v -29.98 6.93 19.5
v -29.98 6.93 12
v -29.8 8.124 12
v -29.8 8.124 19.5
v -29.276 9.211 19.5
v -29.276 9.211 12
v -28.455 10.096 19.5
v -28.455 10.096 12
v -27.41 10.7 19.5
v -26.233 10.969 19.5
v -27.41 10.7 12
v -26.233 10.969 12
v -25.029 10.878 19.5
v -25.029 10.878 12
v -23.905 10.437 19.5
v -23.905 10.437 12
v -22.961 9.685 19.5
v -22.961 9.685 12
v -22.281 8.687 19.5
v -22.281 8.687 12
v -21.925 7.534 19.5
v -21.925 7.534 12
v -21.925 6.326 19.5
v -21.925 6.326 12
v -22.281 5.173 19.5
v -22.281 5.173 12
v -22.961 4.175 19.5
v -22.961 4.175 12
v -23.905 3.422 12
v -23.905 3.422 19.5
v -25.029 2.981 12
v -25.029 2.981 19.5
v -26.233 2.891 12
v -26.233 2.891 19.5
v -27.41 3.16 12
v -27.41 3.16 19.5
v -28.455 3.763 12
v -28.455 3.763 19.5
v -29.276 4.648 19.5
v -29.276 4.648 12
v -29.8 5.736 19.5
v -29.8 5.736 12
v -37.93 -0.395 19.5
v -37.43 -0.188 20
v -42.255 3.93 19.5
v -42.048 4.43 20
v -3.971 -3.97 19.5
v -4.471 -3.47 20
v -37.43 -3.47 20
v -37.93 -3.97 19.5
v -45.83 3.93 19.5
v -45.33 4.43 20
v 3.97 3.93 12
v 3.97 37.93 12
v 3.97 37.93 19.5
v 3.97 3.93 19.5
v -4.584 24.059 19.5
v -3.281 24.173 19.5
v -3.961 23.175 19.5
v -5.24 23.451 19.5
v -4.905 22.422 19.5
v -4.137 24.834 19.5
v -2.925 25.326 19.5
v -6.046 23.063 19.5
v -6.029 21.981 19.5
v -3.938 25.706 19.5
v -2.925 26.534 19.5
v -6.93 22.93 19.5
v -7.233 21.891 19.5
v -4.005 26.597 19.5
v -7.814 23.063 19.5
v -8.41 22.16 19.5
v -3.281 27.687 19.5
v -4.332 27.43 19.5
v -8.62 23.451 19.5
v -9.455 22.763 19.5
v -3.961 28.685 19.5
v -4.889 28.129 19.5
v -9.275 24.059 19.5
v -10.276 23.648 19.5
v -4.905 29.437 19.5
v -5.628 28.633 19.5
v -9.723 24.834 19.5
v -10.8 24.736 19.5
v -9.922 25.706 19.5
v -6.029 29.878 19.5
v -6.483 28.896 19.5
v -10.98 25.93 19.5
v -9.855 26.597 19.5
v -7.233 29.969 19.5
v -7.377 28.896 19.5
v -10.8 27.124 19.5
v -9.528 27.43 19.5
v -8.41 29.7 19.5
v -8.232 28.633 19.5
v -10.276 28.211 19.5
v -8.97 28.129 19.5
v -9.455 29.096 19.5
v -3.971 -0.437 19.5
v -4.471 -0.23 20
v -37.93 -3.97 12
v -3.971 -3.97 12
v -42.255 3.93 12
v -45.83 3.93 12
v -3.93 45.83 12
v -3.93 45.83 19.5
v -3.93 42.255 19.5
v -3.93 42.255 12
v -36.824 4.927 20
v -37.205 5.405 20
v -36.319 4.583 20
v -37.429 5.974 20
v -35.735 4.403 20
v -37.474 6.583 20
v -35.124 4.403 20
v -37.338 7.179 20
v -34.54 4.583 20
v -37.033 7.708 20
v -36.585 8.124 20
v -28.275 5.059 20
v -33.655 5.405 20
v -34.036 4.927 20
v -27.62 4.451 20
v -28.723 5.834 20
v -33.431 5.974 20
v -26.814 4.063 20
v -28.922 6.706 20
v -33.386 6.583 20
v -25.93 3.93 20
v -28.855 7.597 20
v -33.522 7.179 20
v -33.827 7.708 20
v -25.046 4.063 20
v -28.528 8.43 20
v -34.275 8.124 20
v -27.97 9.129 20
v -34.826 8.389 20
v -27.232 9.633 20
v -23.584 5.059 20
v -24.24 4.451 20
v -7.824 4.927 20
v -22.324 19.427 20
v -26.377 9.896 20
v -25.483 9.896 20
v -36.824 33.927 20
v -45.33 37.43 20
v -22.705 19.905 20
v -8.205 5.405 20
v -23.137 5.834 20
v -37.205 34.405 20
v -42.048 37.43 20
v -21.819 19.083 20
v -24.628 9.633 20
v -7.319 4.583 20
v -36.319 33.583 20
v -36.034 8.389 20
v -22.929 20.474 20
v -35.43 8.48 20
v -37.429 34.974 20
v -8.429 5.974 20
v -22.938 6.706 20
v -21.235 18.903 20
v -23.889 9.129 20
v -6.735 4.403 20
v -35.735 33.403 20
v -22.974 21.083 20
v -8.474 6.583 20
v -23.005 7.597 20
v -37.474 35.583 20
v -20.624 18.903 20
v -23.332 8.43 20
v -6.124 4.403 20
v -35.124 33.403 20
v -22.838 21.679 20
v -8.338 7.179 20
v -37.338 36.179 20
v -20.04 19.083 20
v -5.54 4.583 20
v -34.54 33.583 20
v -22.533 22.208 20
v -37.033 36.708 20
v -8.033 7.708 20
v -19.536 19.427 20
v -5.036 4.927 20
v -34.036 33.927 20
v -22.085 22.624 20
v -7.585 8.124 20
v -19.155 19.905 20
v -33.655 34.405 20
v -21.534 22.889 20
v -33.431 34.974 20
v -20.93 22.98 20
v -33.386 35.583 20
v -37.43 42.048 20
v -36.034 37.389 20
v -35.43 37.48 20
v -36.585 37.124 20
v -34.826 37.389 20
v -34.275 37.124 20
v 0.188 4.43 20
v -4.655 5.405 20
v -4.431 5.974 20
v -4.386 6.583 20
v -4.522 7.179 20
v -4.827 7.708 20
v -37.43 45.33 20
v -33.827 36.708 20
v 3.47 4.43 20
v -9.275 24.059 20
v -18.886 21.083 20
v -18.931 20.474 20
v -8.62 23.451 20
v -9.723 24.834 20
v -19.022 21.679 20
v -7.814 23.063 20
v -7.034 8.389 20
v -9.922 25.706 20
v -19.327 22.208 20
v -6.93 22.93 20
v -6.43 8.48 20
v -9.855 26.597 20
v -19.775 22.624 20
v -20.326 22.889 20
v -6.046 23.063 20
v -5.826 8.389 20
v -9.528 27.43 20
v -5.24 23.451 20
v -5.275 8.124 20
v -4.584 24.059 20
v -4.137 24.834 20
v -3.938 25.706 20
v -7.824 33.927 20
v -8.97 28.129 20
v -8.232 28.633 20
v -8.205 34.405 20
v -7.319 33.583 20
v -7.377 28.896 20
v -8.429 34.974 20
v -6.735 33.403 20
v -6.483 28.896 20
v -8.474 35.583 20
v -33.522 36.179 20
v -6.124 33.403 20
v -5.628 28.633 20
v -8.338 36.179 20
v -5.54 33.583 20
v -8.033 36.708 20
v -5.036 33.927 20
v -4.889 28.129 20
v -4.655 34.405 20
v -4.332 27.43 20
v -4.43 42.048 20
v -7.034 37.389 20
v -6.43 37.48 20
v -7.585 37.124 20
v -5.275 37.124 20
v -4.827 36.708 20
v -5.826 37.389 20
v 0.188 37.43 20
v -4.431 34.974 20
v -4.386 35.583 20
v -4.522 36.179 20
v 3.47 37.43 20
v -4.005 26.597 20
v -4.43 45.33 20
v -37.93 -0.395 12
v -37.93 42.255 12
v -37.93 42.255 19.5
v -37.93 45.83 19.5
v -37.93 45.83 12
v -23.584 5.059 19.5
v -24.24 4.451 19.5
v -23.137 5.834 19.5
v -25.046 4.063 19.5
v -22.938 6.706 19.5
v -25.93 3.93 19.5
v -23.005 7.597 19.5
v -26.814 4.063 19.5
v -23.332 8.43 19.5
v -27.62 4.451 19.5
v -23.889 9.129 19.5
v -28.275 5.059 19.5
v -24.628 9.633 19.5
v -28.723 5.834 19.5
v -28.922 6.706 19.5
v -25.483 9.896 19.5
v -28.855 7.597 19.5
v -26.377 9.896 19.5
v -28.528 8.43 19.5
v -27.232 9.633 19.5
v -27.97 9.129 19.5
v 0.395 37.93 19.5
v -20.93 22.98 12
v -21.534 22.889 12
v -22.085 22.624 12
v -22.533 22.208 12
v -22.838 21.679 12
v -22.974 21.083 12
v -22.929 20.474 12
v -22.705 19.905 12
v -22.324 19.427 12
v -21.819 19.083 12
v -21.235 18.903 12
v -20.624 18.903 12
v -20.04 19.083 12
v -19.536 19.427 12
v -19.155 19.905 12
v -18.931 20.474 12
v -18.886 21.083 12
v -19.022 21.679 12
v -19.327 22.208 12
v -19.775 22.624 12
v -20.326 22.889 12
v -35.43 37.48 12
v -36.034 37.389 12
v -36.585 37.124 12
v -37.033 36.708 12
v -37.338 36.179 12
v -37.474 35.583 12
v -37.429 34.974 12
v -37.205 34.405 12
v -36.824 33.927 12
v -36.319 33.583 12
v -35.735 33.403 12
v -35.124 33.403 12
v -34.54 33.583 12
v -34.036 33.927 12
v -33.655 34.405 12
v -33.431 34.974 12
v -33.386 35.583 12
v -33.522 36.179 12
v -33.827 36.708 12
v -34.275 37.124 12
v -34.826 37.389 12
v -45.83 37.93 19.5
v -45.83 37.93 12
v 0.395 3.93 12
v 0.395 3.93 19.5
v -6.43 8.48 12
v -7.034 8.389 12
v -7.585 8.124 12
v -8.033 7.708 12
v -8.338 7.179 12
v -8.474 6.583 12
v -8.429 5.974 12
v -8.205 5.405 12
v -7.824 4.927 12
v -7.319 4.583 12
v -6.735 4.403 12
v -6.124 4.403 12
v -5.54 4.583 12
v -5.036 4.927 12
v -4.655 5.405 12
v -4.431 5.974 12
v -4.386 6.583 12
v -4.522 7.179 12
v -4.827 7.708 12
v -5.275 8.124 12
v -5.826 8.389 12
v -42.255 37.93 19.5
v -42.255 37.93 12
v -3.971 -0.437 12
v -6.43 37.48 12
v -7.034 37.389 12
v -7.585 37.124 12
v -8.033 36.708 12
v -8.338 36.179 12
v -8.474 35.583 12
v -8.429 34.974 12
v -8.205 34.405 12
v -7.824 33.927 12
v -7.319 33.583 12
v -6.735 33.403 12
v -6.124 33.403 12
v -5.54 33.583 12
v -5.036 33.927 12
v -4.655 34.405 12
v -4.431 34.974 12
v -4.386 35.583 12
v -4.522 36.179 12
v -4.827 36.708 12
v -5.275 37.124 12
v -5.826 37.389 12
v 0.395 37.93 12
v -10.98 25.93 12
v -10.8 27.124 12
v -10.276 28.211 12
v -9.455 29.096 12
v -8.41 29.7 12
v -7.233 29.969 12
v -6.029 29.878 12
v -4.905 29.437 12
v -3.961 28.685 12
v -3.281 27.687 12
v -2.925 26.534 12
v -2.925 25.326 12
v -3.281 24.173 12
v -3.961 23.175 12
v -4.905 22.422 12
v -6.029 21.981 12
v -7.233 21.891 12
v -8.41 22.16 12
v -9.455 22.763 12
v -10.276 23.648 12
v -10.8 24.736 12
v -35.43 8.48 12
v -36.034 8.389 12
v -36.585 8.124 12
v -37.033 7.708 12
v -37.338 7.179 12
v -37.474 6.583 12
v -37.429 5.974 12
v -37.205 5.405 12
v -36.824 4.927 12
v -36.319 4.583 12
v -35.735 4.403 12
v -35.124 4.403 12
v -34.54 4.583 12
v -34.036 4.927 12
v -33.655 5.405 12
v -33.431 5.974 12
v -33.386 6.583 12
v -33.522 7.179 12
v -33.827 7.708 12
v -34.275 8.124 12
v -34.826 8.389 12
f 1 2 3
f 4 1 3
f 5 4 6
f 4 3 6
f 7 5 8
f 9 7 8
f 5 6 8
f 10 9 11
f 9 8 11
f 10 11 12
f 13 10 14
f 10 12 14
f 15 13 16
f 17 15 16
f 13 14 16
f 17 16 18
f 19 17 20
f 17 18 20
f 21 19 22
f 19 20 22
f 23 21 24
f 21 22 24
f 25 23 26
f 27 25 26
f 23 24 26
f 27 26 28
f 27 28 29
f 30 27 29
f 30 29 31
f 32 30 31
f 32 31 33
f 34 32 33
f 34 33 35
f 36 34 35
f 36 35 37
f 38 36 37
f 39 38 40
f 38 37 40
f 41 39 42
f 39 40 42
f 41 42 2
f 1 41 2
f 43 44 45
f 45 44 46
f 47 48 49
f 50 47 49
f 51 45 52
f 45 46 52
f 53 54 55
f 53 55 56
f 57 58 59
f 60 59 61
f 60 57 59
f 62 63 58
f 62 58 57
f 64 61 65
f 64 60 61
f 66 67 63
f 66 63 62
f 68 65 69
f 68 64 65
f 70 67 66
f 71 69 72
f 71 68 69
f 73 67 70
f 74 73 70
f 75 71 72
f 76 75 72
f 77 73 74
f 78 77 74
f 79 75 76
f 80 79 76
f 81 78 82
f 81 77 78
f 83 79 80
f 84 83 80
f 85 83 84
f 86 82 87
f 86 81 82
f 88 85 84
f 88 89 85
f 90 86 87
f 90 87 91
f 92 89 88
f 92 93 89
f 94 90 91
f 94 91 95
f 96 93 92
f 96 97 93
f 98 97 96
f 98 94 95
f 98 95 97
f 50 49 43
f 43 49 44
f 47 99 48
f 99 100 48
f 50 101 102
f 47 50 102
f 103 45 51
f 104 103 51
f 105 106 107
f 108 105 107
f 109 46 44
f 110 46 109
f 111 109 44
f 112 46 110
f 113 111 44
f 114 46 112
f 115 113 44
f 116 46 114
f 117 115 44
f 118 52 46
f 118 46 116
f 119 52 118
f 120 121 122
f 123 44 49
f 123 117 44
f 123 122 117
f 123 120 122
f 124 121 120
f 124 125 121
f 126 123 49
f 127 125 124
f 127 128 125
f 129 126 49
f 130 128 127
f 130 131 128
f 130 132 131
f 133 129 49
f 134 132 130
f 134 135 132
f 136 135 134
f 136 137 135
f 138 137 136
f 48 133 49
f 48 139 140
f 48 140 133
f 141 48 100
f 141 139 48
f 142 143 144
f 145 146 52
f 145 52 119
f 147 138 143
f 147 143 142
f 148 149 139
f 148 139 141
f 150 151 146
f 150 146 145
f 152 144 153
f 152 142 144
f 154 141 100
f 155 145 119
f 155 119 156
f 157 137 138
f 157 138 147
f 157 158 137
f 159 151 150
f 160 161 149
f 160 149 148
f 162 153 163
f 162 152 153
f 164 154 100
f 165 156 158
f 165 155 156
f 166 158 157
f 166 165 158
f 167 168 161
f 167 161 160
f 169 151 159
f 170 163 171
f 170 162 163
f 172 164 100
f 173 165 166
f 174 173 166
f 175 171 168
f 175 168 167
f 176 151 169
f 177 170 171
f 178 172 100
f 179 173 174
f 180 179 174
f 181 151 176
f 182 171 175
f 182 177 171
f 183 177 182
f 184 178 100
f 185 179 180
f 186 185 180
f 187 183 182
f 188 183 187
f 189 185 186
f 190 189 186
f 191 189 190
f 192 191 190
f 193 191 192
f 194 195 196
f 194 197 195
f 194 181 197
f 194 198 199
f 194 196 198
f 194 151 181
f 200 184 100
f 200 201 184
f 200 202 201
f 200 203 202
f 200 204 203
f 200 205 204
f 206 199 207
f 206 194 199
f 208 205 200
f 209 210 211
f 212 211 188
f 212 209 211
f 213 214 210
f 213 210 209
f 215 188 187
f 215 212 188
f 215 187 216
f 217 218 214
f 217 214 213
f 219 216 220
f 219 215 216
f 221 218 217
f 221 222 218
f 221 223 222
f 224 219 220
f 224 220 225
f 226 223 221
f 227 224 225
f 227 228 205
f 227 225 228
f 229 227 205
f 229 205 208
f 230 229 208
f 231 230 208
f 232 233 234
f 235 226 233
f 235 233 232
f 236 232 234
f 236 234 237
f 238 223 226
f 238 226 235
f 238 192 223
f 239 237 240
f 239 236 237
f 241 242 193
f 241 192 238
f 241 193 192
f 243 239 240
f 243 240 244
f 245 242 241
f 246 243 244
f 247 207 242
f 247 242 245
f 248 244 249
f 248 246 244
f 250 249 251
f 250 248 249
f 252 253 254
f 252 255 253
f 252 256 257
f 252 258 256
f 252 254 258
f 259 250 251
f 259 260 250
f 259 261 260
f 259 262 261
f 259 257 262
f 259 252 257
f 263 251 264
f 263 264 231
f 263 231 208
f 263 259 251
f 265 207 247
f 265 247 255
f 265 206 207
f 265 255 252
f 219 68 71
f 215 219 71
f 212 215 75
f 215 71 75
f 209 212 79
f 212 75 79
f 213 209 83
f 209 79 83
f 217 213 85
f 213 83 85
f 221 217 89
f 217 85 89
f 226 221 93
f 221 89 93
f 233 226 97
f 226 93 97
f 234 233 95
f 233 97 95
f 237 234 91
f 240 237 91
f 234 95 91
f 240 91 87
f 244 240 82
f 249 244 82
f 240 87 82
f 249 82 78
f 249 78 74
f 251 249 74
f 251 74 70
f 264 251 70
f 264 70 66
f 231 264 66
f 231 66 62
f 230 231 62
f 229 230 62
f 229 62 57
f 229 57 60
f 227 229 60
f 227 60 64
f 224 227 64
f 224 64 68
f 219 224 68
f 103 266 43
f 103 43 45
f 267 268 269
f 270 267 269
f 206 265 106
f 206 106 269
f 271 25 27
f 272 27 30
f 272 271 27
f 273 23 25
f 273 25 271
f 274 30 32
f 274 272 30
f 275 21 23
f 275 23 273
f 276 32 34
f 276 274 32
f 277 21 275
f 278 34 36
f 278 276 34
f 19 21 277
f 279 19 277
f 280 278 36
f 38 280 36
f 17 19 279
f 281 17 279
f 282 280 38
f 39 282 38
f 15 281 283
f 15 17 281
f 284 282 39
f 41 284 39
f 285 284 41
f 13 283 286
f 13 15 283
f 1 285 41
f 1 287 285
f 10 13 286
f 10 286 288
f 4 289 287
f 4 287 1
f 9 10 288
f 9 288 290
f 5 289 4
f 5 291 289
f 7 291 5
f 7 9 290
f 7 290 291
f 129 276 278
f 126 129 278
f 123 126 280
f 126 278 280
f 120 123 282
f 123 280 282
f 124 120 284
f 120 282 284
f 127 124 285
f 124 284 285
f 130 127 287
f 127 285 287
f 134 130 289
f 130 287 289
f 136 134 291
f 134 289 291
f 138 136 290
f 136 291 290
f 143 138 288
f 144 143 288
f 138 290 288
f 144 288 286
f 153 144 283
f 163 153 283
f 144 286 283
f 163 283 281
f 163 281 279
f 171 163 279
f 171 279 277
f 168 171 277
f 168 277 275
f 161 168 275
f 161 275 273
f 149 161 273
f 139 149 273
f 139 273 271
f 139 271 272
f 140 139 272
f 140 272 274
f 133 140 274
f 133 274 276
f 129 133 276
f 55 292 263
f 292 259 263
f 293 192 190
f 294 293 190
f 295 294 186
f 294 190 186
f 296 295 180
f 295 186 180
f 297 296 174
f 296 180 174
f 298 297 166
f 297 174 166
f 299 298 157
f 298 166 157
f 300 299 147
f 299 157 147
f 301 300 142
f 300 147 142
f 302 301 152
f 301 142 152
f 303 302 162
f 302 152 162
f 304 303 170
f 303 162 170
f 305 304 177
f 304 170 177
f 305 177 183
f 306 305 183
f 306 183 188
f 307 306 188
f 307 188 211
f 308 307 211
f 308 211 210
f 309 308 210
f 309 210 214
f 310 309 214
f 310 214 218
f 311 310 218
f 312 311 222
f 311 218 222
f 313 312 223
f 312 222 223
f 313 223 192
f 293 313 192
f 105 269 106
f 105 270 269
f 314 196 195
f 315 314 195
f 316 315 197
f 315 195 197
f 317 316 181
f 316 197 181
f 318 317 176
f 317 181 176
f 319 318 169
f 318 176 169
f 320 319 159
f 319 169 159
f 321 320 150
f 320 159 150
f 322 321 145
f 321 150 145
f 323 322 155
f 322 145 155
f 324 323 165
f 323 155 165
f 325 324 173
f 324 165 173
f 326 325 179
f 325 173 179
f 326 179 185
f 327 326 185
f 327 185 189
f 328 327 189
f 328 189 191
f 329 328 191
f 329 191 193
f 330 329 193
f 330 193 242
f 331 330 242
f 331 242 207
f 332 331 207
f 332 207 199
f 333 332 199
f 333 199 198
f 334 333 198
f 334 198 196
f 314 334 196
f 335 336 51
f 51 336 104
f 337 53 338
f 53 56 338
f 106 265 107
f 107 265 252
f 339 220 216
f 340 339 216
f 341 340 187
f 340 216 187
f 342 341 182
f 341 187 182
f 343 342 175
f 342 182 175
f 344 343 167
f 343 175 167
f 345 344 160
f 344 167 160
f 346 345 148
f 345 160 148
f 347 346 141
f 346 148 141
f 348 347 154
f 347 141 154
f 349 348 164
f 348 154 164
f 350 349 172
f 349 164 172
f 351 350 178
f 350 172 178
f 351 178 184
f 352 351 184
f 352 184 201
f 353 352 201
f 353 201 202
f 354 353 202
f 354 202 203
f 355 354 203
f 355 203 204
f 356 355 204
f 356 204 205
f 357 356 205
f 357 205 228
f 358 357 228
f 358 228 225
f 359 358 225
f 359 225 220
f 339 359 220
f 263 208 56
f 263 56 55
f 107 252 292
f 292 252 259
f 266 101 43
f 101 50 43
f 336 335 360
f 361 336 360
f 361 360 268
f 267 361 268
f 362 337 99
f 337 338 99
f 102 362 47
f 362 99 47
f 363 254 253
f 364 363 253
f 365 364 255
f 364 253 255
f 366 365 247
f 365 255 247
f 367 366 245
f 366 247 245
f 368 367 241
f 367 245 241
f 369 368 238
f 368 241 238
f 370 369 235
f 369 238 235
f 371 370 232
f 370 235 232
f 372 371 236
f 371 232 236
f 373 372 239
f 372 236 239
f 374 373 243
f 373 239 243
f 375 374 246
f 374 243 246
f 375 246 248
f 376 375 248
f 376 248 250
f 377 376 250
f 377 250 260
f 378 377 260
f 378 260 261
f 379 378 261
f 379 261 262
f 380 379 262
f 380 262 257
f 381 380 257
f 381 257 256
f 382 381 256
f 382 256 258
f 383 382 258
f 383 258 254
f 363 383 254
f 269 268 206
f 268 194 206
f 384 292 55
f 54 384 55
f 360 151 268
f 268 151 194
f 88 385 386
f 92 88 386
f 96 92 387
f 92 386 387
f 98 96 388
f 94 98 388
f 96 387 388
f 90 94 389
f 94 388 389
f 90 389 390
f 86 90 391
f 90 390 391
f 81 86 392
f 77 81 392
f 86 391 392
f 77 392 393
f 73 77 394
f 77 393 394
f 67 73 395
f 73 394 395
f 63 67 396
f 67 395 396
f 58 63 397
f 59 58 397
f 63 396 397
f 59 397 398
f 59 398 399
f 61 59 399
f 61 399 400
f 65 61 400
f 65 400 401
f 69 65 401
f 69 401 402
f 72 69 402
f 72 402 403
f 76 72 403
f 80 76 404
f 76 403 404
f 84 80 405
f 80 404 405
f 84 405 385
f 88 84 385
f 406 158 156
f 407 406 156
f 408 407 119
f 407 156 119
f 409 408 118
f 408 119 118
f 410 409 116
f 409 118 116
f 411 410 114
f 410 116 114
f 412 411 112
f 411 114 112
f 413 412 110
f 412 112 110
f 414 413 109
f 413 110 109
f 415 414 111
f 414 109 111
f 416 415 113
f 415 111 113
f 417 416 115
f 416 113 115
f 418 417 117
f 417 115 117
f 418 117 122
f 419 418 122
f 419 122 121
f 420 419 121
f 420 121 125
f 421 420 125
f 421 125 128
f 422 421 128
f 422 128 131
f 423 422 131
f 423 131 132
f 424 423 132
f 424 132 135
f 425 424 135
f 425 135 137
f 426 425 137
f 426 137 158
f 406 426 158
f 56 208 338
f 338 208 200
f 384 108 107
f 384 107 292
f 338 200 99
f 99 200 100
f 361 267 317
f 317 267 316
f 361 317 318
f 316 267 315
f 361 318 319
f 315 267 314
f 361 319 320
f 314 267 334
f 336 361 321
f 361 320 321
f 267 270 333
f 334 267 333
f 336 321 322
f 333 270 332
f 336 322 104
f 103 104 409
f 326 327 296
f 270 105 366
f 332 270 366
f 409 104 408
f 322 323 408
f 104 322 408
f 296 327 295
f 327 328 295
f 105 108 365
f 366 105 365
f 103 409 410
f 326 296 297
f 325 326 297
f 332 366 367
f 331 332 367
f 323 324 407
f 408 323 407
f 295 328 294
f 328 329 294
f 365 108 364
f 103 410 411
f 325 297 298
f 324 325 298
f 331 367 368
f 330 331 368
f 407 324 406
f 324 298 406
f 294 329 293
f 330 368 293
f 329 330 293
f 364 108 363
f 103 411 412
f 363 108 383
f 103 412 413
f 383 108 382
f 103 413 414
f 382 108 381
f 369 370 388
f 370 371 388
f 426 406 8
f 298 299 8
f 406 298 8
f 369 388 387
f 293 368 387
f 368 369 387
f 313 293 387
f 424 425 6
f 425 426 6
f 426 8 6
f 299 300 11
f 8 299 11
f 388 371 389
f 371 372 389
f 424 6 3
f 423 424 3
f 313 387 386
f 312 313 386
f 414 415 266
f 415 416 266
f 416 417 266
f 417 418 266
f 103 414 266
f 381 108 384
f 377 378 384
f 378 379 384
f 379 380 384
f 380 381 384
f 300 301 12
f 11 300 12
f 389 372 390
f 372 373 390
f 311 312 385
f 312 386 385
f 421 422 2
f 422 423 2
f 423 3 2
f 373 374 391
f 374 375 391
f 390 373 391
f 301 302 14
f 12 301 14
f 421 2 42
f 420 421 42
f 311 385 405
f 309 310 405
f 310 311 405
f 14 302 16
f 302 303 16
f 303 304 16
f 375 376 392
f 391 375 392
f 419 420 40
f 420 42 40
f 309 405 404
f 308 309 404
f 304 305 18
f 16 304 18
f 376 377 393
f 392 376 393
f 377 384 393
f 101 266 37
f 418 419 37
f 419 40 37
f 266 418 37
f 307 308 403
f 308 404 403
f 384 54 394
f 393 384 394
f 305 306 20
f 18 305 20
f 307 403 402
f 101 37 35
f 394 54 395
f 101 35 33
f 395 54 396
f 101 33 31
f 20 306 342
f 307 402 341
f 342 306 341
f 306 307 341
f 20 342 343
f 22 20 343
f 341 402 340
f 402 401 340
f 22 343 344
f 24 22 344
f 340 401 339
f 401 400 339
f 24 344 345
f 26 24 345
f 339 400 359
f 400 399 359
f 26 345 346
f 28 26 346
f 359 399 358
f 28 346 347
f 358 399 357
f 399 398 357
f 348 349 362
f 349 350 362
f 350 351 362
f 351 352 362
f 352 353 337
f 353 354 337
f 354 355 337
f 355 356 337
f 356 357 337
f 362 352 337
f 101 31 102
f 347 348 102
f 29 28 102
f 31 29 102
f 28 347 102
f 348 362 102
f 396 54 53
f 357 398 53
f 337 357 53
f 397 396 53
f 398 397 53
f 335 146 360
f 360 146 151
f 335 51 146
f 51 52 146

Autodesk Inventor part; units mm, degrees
ref_plane "YZ Plane" through (0, 0, 0) normal (1, 0, 0) x (0, 1, 0)
ref_plane "XZ Plane" through (0, 0, 0) normal (0, 1, 0) x (-1, 0, 0)
ref_plane "Work Plane1" through (0, 0, 10) normal (0, 0, 1) x (1, 0, 0)
sketch "Sketch1" plane through (0, 0, 10) normal (0, 0, 1) x (1, 0, 0)
  line L0 (-4.0299, -0.3538) -> (-2.2322, 1.4439) construction
  arc A0 (-1.4439, 2.2322) -> (-2.2322, 1.4439) centre (-0.9299, 0.9299) ccw construction
  line L1 (-1.4439, 2.2322) -> (0.3538, 4.0299) construction
  line L2 (-37.8299, 42.8299) -> (-37.8299, 37.8299) construction
  line L3 (-37.8299, 37.8299) -> (-42.9208, 37.8299) construction
  line L4 (-37.8299, 42.2137) -> (-37.8299, 45.8299) construction
  line L5 (-37.8299, 45.8299) -> (-4.0299, 45.8299) construction
  line L6 (-4.0299, 45.8299) -> (-4.0299, 42.2137) construction
  line L7 (-4.0299, 4.0299) -> (0.3538, 4.0299) projected
  circle A1 centre (-20.9299, 20.9299) radius 17.5 projected
  line L8 (-20.9299, 58.9723) -> (17.1124, 20.9299) construction
  line L9 (17.1124, 20.9299) -> (-20.9299, -17.1124) construction
  line L10 (-20.9299, -17.1124) -> (-58.9723, 20.9299) construction
  line L11 (-58.9723, 20.9299) -> (-20.9299, 58.9723) construction
  line L12 (-20.9299, 58.9723) -> (-20.9299, -17.1124) construction
  line L13 (17.1124, 20.9299) -> (-58.9723, 20.9299) construction
  line L14 (-20.9299, 58.9723) -> (32.8701, 58.9723) construction
  line L15 (-43.4299, 43.4299) -> (1.5701, 43.4299) construction
  line L16 (1.5701, 43.4299) -> (1.5701, -1.5701) construction
  line L17 (1.5701, -1.5701) -> (-43.4299, -1.5701) construction
  line L18 (-43.4299, -1.5701) -> (-43.4299, 43.4299) construction
  line L19 (-43.4299, 43.4299) -> (1.5701, -1.5701) construction
  line L20 (1.5701, 43.4299) -> (-43.4299, -1.5701) construction
  line L21 (-43.4299, 5.3876) -> (-43.4299, 36.4723)
  line L22 (-43.4299, 36.4723) -> (-36.4723, 43.4299)
  line L23 (-36.4723, 43.4299) -> (-5.3876, 43.4299)
  line L24 (-5.3876, 43.4299) -> (1.5701, 36.4723)
  line L25 (1.5701, 36.4723) -> (1.5701, 5.3876)
  line L26 (1.5701, 5.3876) -> (-5.3876, -1.5701)
  line L27 (-5.3876, -1.5701) -> (-36.4723, -1.5701)
  line L28 (-36.4723, -1.5701) -> (-43.4299, 5.3876)
  line L29 (-4.0299, 42.2137) -> (-37.8299, 42.2137) projected
  line L30 (-4.0299, -0.3538) -> (-4.0299, 4.0299) projected
  circle A2 centre (-20.9299, 20.9299) radius 1.5
  line L31 (-10.9299, 10.9299) -> (-30.9299, 10.9299) construction
  line L32 (-30.9299, 10.9299) -> (-30.9299, 30.9299) construction
  line L33 (-30.9299, 30.9299) -> (-10.9299, 30.9299) construction
  line L34 (-10.9299, 30.9299) -> (-10.9299, 10.9299) construction
  line L35 (-10.9299, 10.9299) -> (-30.9299, 30.9299) construction
  line L36 (-30.9299, 10.9299) -> (-10.9299, 30.9299) construction
  circle A3 centre (-30.9299, 30.9299) radius 1.4
  circle A4 centre (-30.9299, 10.9299) radius 1.4
  circle A5 centre (-10.9299, 10.9299) radius 1.4
  line L37 (-45.8299, 37.8299) -> (-42.0723, 37.8299) construction
  line L38 (-42.1723, 37.7299) -> (-45.8299, 37.7299)
  line L39 (-45.8299, 37.7299) -> (-45.8299, 4.1299)
  line L40 (-45.8299, 4.1299) -> (-42.1723, 4.1299)
  line L41 (-42.1723, 4.1299) -> (-42.1723, 37.7299)
  line L42 (-45.8299, 4.0299) -> (-42.0723, 4.0299) construction
  line L43 (-45.8299, 37.8299) -> (-42.0723, 37.8299) projected
  line L44 (-37.7299, 45.8299) -> (-4.1299, 45.8299)
  line L45 (-4.1299, 45.8299) -> (-4.1299, 42.1723)
  line L46 (-4.1299, 42.1723) -> (-37.7299, 42.1723)
  line L47 (-37.7299, 42.1723) -> (-37.7299, 45.8299)
  line L48 (0.4701, 37.8299) -> (0.4701, 4.0299) construction
  line L49 (0.4701, 4.0299) -> (3.9701, 4.0299) construction
  line L50 (3.9701, 37.8299) -> (3.9701, 4.0299) construction
  line L51 (0.4701, 37.8299) -> (3.9701, 37.8299) construction
  line L52 (-45.8299, -3.9701) -> (-4.0299, -3.9701) construction
  line L53 (0.3124, 37.7299) -> (3.9701, 37.7299)
  line L54 (3.9701, 37.7299) -> (3.9701, 4.1299)
  line L55 (3.9701, 4.1299) -> (0.3124, 4.1299)
  line L56 (0.3124, 4.1299) -> (0.3124, 37.7299)
  line L57 (-4.1713, -0.3538) -> (-37.7299, -0.3538)
  line L58 (-37.7299, -0.3538) -> (-37.7299, -3.9701)
  line L59 (-37.7299, -3.9701) -> (-4.1713, -3.9701)
  line L60 (-4.1713, -3.9701) -> (-4.1713, -0.3538)
  point P0 (-37.8299, 4.0299)
  dimension "d18" = 53.8
  dimension "d19" = 45
  dimension "d20" = 53.8
  dimension "d21" = 45
  dimension "d22" = 45
  dimension "d30" = 20
  dimension "d31" = 20
  dimension "d32" = 2.8
  dimension "d33" = 2.8
  dimension "d34" = 2.8
  dimension "d35" = 3
  dimension "d36" = 0.1
  dimension "d37" = 0.1
  dimension "d38" = 0.1
  dimension "d39" = 0.1
extrude "Extrusion1" add sketch "Sketch1" along normal blind 10 contours L30 L26 L57 L28 L41 L22 L46 L24 L56 L7 | L7 L26 L30 | L56 L24 L25 L26 | L26 L25 L24 L53 L54 L55 | L60 L59 L58 L57 L28 L27 L26 | L26 L27 L28 L57 | L46 L22 L29 L24 | L24 L29 L45 | L40 L39 L38 L22 L21 L28 | L28 L21 L22 L41 | L29 L22 L23 L24 | L24 L23 L22 L29 L47 L44 L45 | L47 L29 L22 | A1 | A2 | A3 | A4 | A5
sketch "Skizze4" plane through (0, 0, 20) normal (0, 0, 1) x (1, 0, 0)
  line L0 (-37.7299, 42.1723) -> (-42.1723, 37.7299) projected
  line L1 (-42.1723, 37.7299) -> (-45.8299, 37.7299) projected
  line L2 (-45.8299, 37.7299) -> (-45.8299, 4.1299) construction
  line L3 (-45.8299, 4.1299) -> (-42.1723, 4.1299) projected
  line L4 (-42.1723, 4.1299) -> (-37.6885, -0.3538) projected
  line L5 (-37.6885, -0.3538) -> (-37.7299, -0.3538) projected
  line L6 (-37.7299, -0.3538) -> (-37.7299, -3.9701) projected
  line L7 (-37.7299, -3.9701) -> (-4.1713, -3.9701) construction
  line L8 (-4.1713, -3.9701) -> (-4.1713, -0.3538) projected
  line L9 (-4.1713, -0.3538) -> (0.3124, 4.1299) projected
  line L10 (0.3124, 4.1299) -> (3.9701, 4.1299) projected
  line L11 (3.9701, 4.1299) -> (3.9701, 37.7299) construction
  line L12 (3.9701, 37.7299) -> (0.3124, 37.7299) projected
  line L13 (0.3124, 37.7299) -> (-4.1299, 42.1723) projected
  line L14 (-4.1299, 42.1723) -> (-4.1299, 45.8299) projected
  line L15 (-4.1299, 45.8299) -> (-37.7299, 45.8299) construction
  line L16 (-37.7299, 45.8299) -> (-37.7299, 42.1723) projected
  line L17 (-37.9299, 46.0299) -> (-3.9299, 46.0299) construction
  line L18 (-3.9299, 46.0299) -> (-3.9299, 42.2551)
  line L19 (-3.9299, 42.2551) -> (0.3953, 37.9299)
  line L20 (0.3953, 37.9299) -> (4.1701, 37.9299)
  line L21 (4.1701, 37.9299) -> (4.1701, 3.9299) construction
  line L22 (4.1701, 3.9299) -> (0.3953, 3.9299)
  line L23 (0.3953, 3.9299) -> (-3.9713, -0.4367)
  line L24 (-3.9713, -0.4367) -> (-3.9713, -4.1701)
  line L25 (-3.9713, -4.1701) -> (-37.9299, -4.1701) construction
  line L26 (-37.9299, -4.1701) -> (-37.9299, -0.3953)
  line L27 (-37.9299, -0.3953) -> (-42.2551, 3.9299)
  line L28 (-42.2551, 3.9299) -> (-46.0299, 3.9299)
  line L29 (-46.0299, 3.9299) -> (-46.0299, 37.9299) construction
  line L30 (-46.0299, 37.9299) -> (-42.2551, 37.9299)
  line L31 (-42.2551, 37.9299) -> (-37.9299, 42.2551)
  line L32 (-37.9299, 42.2551) -> (-37.9299, 46.0299)
  line L33 (-45.8299, 37.7299) -> (-45.8299, 37.9299)
  line L34 (-4.1299, 45.8299) -> (-37.7299, 45.8299) projected
  line L35 (-37.7299, 45.8299) -> (-37.9299, 45.8299)
  line L36 (-4.1299, 45.8299) -> (-3.9299, 45.8299)
  line L37 (3.9701, 37.7299) -> (3.9701, 37.9299)
  line L38 (3.9701, 4.1299) -> (3.9701, 37.7299) projected
  line L39 (3.9701, 4.1299) -> (3.9701, 3.9299)
  line L40 (-4.1713, -3.9701) -> (-3.9713, -3.9701)
  line L41 (-37.7299, -3.9701) -> (-37.9299, -3.9701)
  line L42 (-45.8299, 4.1299) -> (-45.8299, 3.9299)
  point P0 (0, 0)
  dimension "d40" = 0.2
extrude "IM_offset" add sketch "Skizze4" against normal up to surface (10 mm away)
ref_plane "Work Plane5" through (-37.9299, 20.9299, 10) normal (0, -1, 0) x (1, 0, 0)
ref_plane "Work Plane6" through (-20.9299, 3.9299, 10) normal (1, 0, 0) x (0, 0, -1)
sketch "Sketch24" plane through (0, 0, 10) normal (0, 0, -1) x (-1, 0, 0)
  line L0 (6.4299, 6.4299) -> (35.4299, 6.4299) construction
  line L1 (35.4299, 6.4299) -> (35.4299, 35.4299) construction
  line L2 (35.4299, 35.4299) -> (6.4299, 35.4299) construction
  line L3 (6.4299, 35.4299) -> (6.4299, 6.4299) construction
  line L4 (6.4299, 6.4299) -> (35.4299, 35.4299) construction
  line L5 (35.4299, 6.4299) -> (6.4299, 35.4299) construction
  point P0 (0, 0)
  point P1 (20.9299, 20.9299)
  dimension "d143" = 29
  dimension "d144" = 29
hole "Hole1" at (-20.9299, 20.9299, 10) at (-6.4299, 6.4299, 10) at (-35.4299, 6.4299, 10) at (-35.4299, 35.4299, 10) at (-6.4299, 35.4299, 10) direction (0, 0, 1) diameter 4.1 end through all
sketch "Skizze28" plane through (0, 0, 10) normal (0, 0, -1) x (-1, 0, 0)
  circle A0 centre (25.9299, 6.9299) radius 3 projected
  circle A1 centre (6.9299, 25.9299) radius 3 projected
  line L0 (9.9299, 4.9299) -> (1.9299, 4.9299) projected
  line L1 (4.9299, 1.9299) -> (1.9299, 4.9299) projected
  line L2 (36.9299, 1.9299) -> (4.9299, 1.9299) projected
  line L3 (39.9299, 4.9299) -> (36.9299, 1.9299) projected
  line L4 (39.9299, 36.9299) -> (39.9299, 4.9299) projected
  line L5 (36.9299, 39.9299) -> (39.9299, 36.9299) projected
  line L6 (4.9299, 39.9299) -> (36.9299, 39.9299) projected
  line L7 (1.9299, 36.9299) -> (4.9299, 39.9299) projected
  line L8 (1.9299, 8.9299) -> (1.9299, 36.9299) projected
  line L9 (1.9299, 8.9299) -> (9.9299, 8.9299) projected
  line L10 (9.9299, 8.9299) -> (9.9299, 4.9299) projected
  circle A2 centre (34.9299, 6.9299) radius 2 projected
  circle A3 centre (6.9299, 25.9299) radius 4.05
  circle A4 centre (25.9299, 6.9299) radius 4.05
  point P0 (0, 0)
  dimension "d173" = 8.1
  dimension "d174" = 8.1
extrude "Extrusion23" cut sketch "Skizze28" against normal blind 9.5 contours A0 | A1 | A3 | A4
chamfer "Fase2" distance 0.5 angle 45 27 edges at (-2.8799, 25.9299, 10) (-35.4299, 4.3799, 10) (-6.4299, 4.3799, 10) (-20.9299, 18.8799, 10) (-35.4299, 33.3799, 10) (-6.4299, 33.3799, 10) (-21.8799, 6.9299, 10) (-45.8299, 20.9299, 10) (-20.9506, -3.9701, 10) (3.9701, 20.9299, 20) (3.9701, 20.9299, 10) (-20.9299, 45.8299, 10) (-44.0425, 37.9299, 20) (-40.0925, 40.0925, 20) (-37.9299, 44.0425, 20) (-20.9299, 45.8299, 20) (-45.8299, 20.9299, 20) (-44.0425, 3.9299, 20) (-20.9506, -3.9701, 20) (-37.9299, -2.1827, 20) (-40.0925, 1.7673, 20) (-3.9713, -2.2034, 20) (-1.788, 1.7466, 20) (2.1827, 3.9299, 20) (2.1827, 37.9299, 20) (-1.7673, 40.0925, 20) (-3.9299, 44.0425, 20)
sketch "Skizze29" plane through (0, 0, 20) normal (0, 0, 1) x (1, 0, 0)
  circle A0 centre (-35.4299, 6.4299) radius 2.55 projected
  circle A1 centre (-25.9299, 6.9299) radius 4.55 projected
  circle A2 centre (-20.9299, 20.9299) radius 2.55 projected
  circle A3 centre (-6.9299, 25.9299) radius 4.55 projected
  circle A4 centre (-6.4299, 35.4299) radius 2.55 projected
  circle A5 centre (-6.4299, 6.4299) radius 2.55 projected
  circle A6 centre (-35.4299, 35.4299) radius 2.55 projected
  line L0 (3.4701, 4.4299) -> (3.4701, 37.4299) projected
  line L1 (0.1882, 4.4299) -> (3.4701, 4.4299) projected
  line L2 (-4.4713, -0.2296) -> (0.1882, 4.4299) projected
  line L3 (-4.4713, -3.4701) -> (-4.4713, -0.2296) projected
  line L4 (-37.4299, -3.4701) -> (-4.4713, -3.4701) projected
  line L5 (-37.4299, -0.1882) -> (-37.4299, -3.4701) projected
  line L6 (-42.048, 4.4299) -> (-37.4299, -0.1882) projected
  line L7 (-45.3299, 4.4299) -> (-42.048, 4.4299) projected
  line L8 (-45.3299, 37.4299) -> (-45.3299, 4.4299) projected
  line L9 (-42.048, 37.4299) -> (-45.3299, 37.4299) projected
  line L10 (-37.4299, 42.048) -> (-42.048, 37.4299) projected
  line L11 (-37.4299, 45.3299) -> (-37.4299, 42.048) projected
  line L12 (-4.4299, 45.3299) -> (-37.4299, 45.3299) projected
  line L13 (-4.4299, 42.048) -> (-4.4299, 45.3299) projected
  line L14 (0.1882, 37.4299) -> (-4.4299, 42.048) projected
  line L15 (3.4701, 37.4299) -> (0.1882, 37.4299) projected
  point P0 (0, 0)
hole "Bohrung2" at (-6.9299, 25.9299, 20) at (-25.9299, 6.9299, 20) direction (0, 0, -1) diameter 6 end through all
sketch "Sketch30" plane through (3.9701, 3.9299, 19.5) normal (1, 0, 0) x (0, 0, -1)
  line L0 (9.5, 44.7711) -> (7.5, 44.7711)
  line L1 (7.5, 44.7711) -> (7.5, -17.5234)
  line L2 (7.5, -17.5234) -> (9.5, -17.5234)
  line L3 (9.5, -17.5234) -> (9.5, 44.7711)
  line L4 (9.5, 0.5) -> (9.5, 33.5) projected
  point P0 (19.5, -3.9299)
  dimension "d187" = 2
extrude "Extrusion24" cut sketch "Sketch30" against normal through all
properties part number "20_Cube_Insert_Kinematic_Mirror_90_pro_magnetic"
